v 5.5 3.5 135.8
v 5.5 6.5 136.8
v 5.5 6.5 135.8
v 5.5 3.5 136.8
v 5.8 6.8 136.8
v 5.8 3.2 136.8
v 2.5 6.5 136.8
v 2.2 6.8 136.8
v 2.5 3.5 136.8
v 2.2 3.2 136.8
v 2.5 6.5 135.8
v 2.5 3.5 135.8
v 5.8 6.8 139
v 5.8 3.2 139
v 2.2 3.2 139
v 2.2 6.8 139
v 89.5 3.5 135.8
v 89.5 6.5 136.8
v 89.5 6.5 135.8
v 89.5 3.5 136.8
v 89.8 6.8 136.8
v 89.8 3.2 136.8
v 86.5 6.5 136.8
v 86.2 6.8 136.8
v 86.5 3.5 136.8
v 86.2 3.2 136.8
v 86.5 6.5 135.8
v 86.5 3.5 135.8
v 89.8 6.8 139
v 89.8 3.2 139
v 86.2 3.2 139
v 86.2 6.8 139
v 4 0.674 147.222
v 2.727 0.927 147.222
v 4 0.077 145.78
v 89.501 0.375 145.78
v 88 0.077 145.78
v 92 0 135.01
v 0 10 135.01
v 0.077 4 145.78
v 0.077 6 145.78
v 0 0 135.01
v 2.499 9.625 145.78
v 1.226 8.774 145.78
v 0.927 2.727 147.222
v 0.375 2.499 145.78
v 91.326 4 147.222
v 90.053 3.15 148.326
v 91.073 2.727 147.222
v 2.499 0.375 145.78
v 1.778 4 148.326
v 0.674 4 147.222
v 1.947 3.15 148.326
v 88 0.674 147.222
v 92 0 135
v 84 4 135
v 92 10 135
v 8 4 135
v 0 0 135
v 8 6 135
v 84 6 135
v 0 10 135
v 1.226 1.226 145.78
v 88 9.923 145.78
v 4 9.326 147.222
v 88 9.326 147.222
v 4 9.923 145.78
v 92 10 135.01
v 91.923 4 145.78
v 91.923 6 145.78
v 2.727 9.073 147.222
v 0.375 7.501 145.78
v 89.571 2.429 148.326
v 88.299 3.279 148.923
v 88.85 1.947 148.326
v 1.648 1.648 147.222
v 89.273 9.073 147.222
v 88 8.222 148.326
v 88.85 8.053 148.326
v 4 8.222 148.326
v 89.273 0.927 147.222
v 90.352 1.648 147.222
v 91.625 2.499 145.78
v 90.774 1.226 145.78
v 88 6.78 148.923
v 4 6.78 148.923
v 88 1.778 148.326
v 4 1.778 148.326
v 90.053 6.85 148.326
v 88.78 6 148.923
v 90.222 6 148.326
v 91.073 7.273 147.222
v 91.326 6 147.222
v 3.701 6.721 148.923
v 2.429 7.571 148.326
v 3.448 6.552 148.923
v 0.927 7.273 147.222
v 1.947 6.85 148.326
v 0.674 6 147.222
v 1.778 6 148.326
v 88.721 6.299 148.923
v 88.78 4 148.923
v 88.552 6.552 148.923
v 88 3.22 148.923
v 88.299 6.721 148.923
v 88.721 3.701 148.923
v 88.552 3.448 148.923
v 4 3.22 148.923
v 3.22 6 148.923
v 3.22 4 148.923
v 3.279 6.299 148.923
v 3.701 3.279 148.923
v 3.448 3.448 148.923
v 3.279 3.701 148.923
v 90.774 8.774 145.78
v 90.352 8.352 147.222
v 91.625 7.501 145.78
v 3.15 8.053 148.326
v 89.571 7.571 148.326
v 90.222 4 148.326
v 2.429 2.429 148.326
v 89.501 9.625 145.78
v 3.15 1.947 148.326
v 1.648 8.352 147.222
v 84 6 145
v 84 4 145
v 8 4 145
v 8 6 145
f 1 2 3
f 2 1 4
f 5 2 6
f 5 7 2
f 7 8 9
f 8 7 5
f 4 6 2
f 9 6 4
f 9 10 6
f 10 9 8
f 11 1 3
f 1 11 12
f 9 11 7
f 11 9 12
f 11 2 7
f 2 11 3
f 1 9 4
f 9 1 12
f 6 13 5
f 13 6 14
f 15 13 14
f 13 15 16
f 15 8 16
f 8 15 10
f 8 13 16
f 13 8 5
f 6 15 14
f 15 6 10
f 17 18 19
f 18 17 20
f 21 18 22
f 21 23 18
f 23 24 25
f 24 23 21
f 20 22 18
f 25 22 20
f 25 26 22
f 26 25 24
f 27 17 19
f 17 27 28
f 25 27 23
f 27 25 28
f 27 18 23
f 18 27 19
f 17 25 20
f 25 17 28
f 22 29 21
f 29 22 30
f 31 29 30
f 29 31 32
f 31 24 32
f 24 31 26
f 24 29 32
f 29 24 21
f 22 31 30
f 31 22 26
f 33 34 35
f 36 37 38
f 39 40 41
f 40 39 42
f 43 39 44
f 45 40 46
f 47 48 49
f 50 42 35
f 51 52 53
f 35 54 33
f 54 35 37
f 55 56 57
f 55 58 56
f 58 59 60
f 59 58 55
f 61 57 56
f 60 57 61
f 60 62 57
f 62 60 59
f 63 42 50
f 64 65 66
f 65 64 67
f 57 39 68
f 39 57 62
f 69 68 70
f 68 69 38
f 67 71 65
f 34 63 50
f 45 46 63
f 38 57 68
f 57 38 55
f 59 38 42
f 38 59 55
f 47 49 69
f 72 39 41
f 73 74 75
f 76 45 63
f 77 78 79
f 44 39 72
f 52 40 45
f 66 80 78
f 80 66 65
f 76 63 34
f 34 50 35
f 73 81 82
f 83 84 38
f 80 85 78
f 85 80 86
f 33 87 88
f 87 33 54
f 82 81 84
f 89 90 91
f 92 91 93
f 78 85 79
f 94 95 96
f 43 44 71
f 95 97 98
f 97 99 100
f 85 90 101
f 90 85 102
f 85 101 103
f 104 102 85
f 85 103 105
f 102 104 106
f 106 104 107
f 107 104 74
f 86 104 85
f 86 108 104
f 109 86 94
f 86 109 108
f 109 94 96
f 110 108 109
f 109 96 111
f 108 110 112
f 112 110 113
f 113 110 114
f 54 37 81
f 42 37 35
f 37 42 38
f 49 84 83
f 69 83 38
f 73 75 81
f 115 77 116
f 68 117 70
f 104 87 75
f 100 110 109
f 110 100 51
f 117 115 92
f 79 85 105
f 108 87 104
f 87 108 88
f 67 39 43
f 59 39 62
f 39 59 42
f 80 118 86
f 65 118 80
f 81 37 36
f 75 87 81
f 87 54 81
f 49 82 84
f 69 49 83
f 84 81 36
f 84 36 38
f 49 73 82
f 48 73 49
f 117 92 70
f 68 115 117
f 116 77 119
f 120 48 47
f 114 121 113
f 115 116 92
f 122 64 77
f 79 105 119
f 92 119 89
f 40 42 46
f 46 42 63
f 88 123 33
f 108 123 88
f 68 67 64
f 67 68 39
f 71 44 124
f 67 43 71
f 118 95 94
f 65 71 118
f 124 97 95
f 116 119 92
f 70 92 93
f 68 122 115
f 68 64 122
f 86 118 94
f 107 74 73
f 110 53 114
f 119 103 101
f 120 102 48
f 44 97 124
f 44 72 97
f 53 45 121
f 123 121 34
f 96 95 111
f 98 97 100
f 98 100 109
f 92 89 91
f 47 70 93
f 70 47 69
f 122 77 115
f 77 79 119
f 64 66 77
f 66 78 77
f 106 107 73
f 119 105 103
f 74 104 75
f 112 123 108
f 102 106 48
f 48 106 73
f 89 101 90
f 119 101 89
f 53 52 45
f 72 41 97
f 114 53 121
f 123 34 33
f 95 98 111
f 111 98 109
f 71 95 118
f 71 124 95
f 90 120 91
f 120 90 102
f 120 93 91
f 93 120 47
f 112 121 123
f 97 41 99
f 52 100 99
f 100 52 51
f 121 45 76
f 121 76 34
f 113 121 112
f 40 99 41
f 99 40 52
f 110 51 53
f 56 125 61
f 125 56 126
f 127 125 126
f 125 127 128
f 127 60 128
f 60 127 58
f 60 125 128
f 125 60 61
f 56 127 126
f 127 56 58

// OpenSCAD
// PrimeBind Toploader Case — Flat (no logo)
// Identical to pb_toploader_test.scad but front face is fully flat — no logo cutout.
//
// EXPORT:
//   RENDER = "body" → toploader_flat_body.stl
//   RENDER = "cap"  → toploader_flat_cap.stl

// ─── INTERNAL DIMENSIONS ───────────────────────────────────────
inner_w   = 76.0;
inner_d   = 2.0;

// ─── WALLS ─────────────────────────────────────────────────────
face_wall = 4.0;
side_wall = 8.0;
floor_t   = 3.0;

// ─── WINDOW — sized to show only the Pokemon card ──────────────
card_w      = 63.0;
card_h      = 88.0;
card_bottom = 4.0;
win_w  = card_w;
win_x  = side_wall + (inner_w - win_w) / 2;
win_z  = floor_t + card_bottom;

// ─── OUTER GEOMETRY ────────────────────────────────────────────
outer_w   = inner_w + 2*side_wall;    // 92mm
outer_d   = inner_d + 2*face_wall;    // 10mm
r_edge    = 4.0;

// ─── HEIGHTS ───────────────────────────────────────────────────
body_h    = 95.0;    // floor 3mm + interior 92mm (window shows full 88mm card)
cap_h     = 14.0;    // ceiling 4mm + interior 10mm

// ─── MAGNETS ───────────────────────────────────────────────────
mag_r        = 1.8;
mag_dep      = 3.2;
mag_seal     = 0.8;
mag_corner_x = side_wall / 2;
mag_cy       = outer_d / 2;
snap_r       = 1.5;
snap_h       = 1.0;

$fn = 32;

// ─── ROUNDED BOX MODULES ───────────────────────────────────────
module rrect_flat_top(x, y, z, r) {
    hull() {
        for (xi = [r, x-r]) for (yi = [r, y-r])
            translate([xi, yi, r]) sphere(r=r, $fn=16);
        translate([0, 0, z-0.01]) cube([x, y, 0.01]);
    }
}

module rrect_flat_bottom(x, y, z, r) {
    hull() {
        cube([x, y, 0.01]);
        for (xi = [r, x-r]) for (yi = [r, y-r])
            translate([xi, yi, z-r]) sphere(r=r, $fn=16);
    }
}

// ─── BODY ──────────────────────────────────────────────────────
module body() {
    difference() {
        rrect_flat_top(outer_w, outer_d, body_h, r_edge);

        // interior cavity
        translate([side_wall, face_wall, floor_t])
            cube([inner_w, inner_d, body_h]);

        // back face window — card-sized opening, hides toploader border
        translate([win_x, outer_d - face_wall, win_z])
            cube([win_w, face_wall, body_h - win_z]);

        // 2 square magnet pockets with snap lip
        for (mx = [mag_corner_x, outer_w - mag_corner_x]) {
            translate([mx - mag_r, mag_cy - mag_r, body_h - mag_dep - mag_seal])
                cube([mag_r*2, mag_r*2, mag_dep - snap_h]);
            translate([mx - snap_r, mag_cy - snap_r, body_h - mag_seal - snap_h])
                cube([snap_r*2, snap_r*2, snap_h]);
        }
    }
}

// ─── CAP ───────────────────────────────────────────────────────
module cap() {
    difference() {
        rrect_flat_bottom(outer_w, outer_d, cap_h, r_edge);

        // interior cavity
        translate([side_wall, face_wall, 0])
            cube([inner_w, inner_d, cap_h - face_wall]);

        // 2 square magnet pockets with snap lip
        for (mx = [mag_corner_x, outer_w - mag_corner_x]) {
            translate([mx - snap_r, mag_cy - snap_r, mag_seal])
                cube([snap_r*2, snap_r*2, snap_h]);
            translate([mx - mag_r, mag_cy - mag_r, mag_seal + snap_h])
                cube([mag_r*2, mag_r*2, mag_dep - snap_h]);
        }
    }
}

// ─── RENDER ────────────────────────────────────────────────────
// "body" → export toploader_flat_body.stl
// "cap"  → export toploader_flat_cap.stl
// "both" → preview assembled with gap
RENDER = "cap";

if (RENDER == "both" || RENDER == "body") color("white") body();
if (RENDER == "both" || RENDER == "cap")  color("white") translate([0, 0, body_h + 40]) cap();
